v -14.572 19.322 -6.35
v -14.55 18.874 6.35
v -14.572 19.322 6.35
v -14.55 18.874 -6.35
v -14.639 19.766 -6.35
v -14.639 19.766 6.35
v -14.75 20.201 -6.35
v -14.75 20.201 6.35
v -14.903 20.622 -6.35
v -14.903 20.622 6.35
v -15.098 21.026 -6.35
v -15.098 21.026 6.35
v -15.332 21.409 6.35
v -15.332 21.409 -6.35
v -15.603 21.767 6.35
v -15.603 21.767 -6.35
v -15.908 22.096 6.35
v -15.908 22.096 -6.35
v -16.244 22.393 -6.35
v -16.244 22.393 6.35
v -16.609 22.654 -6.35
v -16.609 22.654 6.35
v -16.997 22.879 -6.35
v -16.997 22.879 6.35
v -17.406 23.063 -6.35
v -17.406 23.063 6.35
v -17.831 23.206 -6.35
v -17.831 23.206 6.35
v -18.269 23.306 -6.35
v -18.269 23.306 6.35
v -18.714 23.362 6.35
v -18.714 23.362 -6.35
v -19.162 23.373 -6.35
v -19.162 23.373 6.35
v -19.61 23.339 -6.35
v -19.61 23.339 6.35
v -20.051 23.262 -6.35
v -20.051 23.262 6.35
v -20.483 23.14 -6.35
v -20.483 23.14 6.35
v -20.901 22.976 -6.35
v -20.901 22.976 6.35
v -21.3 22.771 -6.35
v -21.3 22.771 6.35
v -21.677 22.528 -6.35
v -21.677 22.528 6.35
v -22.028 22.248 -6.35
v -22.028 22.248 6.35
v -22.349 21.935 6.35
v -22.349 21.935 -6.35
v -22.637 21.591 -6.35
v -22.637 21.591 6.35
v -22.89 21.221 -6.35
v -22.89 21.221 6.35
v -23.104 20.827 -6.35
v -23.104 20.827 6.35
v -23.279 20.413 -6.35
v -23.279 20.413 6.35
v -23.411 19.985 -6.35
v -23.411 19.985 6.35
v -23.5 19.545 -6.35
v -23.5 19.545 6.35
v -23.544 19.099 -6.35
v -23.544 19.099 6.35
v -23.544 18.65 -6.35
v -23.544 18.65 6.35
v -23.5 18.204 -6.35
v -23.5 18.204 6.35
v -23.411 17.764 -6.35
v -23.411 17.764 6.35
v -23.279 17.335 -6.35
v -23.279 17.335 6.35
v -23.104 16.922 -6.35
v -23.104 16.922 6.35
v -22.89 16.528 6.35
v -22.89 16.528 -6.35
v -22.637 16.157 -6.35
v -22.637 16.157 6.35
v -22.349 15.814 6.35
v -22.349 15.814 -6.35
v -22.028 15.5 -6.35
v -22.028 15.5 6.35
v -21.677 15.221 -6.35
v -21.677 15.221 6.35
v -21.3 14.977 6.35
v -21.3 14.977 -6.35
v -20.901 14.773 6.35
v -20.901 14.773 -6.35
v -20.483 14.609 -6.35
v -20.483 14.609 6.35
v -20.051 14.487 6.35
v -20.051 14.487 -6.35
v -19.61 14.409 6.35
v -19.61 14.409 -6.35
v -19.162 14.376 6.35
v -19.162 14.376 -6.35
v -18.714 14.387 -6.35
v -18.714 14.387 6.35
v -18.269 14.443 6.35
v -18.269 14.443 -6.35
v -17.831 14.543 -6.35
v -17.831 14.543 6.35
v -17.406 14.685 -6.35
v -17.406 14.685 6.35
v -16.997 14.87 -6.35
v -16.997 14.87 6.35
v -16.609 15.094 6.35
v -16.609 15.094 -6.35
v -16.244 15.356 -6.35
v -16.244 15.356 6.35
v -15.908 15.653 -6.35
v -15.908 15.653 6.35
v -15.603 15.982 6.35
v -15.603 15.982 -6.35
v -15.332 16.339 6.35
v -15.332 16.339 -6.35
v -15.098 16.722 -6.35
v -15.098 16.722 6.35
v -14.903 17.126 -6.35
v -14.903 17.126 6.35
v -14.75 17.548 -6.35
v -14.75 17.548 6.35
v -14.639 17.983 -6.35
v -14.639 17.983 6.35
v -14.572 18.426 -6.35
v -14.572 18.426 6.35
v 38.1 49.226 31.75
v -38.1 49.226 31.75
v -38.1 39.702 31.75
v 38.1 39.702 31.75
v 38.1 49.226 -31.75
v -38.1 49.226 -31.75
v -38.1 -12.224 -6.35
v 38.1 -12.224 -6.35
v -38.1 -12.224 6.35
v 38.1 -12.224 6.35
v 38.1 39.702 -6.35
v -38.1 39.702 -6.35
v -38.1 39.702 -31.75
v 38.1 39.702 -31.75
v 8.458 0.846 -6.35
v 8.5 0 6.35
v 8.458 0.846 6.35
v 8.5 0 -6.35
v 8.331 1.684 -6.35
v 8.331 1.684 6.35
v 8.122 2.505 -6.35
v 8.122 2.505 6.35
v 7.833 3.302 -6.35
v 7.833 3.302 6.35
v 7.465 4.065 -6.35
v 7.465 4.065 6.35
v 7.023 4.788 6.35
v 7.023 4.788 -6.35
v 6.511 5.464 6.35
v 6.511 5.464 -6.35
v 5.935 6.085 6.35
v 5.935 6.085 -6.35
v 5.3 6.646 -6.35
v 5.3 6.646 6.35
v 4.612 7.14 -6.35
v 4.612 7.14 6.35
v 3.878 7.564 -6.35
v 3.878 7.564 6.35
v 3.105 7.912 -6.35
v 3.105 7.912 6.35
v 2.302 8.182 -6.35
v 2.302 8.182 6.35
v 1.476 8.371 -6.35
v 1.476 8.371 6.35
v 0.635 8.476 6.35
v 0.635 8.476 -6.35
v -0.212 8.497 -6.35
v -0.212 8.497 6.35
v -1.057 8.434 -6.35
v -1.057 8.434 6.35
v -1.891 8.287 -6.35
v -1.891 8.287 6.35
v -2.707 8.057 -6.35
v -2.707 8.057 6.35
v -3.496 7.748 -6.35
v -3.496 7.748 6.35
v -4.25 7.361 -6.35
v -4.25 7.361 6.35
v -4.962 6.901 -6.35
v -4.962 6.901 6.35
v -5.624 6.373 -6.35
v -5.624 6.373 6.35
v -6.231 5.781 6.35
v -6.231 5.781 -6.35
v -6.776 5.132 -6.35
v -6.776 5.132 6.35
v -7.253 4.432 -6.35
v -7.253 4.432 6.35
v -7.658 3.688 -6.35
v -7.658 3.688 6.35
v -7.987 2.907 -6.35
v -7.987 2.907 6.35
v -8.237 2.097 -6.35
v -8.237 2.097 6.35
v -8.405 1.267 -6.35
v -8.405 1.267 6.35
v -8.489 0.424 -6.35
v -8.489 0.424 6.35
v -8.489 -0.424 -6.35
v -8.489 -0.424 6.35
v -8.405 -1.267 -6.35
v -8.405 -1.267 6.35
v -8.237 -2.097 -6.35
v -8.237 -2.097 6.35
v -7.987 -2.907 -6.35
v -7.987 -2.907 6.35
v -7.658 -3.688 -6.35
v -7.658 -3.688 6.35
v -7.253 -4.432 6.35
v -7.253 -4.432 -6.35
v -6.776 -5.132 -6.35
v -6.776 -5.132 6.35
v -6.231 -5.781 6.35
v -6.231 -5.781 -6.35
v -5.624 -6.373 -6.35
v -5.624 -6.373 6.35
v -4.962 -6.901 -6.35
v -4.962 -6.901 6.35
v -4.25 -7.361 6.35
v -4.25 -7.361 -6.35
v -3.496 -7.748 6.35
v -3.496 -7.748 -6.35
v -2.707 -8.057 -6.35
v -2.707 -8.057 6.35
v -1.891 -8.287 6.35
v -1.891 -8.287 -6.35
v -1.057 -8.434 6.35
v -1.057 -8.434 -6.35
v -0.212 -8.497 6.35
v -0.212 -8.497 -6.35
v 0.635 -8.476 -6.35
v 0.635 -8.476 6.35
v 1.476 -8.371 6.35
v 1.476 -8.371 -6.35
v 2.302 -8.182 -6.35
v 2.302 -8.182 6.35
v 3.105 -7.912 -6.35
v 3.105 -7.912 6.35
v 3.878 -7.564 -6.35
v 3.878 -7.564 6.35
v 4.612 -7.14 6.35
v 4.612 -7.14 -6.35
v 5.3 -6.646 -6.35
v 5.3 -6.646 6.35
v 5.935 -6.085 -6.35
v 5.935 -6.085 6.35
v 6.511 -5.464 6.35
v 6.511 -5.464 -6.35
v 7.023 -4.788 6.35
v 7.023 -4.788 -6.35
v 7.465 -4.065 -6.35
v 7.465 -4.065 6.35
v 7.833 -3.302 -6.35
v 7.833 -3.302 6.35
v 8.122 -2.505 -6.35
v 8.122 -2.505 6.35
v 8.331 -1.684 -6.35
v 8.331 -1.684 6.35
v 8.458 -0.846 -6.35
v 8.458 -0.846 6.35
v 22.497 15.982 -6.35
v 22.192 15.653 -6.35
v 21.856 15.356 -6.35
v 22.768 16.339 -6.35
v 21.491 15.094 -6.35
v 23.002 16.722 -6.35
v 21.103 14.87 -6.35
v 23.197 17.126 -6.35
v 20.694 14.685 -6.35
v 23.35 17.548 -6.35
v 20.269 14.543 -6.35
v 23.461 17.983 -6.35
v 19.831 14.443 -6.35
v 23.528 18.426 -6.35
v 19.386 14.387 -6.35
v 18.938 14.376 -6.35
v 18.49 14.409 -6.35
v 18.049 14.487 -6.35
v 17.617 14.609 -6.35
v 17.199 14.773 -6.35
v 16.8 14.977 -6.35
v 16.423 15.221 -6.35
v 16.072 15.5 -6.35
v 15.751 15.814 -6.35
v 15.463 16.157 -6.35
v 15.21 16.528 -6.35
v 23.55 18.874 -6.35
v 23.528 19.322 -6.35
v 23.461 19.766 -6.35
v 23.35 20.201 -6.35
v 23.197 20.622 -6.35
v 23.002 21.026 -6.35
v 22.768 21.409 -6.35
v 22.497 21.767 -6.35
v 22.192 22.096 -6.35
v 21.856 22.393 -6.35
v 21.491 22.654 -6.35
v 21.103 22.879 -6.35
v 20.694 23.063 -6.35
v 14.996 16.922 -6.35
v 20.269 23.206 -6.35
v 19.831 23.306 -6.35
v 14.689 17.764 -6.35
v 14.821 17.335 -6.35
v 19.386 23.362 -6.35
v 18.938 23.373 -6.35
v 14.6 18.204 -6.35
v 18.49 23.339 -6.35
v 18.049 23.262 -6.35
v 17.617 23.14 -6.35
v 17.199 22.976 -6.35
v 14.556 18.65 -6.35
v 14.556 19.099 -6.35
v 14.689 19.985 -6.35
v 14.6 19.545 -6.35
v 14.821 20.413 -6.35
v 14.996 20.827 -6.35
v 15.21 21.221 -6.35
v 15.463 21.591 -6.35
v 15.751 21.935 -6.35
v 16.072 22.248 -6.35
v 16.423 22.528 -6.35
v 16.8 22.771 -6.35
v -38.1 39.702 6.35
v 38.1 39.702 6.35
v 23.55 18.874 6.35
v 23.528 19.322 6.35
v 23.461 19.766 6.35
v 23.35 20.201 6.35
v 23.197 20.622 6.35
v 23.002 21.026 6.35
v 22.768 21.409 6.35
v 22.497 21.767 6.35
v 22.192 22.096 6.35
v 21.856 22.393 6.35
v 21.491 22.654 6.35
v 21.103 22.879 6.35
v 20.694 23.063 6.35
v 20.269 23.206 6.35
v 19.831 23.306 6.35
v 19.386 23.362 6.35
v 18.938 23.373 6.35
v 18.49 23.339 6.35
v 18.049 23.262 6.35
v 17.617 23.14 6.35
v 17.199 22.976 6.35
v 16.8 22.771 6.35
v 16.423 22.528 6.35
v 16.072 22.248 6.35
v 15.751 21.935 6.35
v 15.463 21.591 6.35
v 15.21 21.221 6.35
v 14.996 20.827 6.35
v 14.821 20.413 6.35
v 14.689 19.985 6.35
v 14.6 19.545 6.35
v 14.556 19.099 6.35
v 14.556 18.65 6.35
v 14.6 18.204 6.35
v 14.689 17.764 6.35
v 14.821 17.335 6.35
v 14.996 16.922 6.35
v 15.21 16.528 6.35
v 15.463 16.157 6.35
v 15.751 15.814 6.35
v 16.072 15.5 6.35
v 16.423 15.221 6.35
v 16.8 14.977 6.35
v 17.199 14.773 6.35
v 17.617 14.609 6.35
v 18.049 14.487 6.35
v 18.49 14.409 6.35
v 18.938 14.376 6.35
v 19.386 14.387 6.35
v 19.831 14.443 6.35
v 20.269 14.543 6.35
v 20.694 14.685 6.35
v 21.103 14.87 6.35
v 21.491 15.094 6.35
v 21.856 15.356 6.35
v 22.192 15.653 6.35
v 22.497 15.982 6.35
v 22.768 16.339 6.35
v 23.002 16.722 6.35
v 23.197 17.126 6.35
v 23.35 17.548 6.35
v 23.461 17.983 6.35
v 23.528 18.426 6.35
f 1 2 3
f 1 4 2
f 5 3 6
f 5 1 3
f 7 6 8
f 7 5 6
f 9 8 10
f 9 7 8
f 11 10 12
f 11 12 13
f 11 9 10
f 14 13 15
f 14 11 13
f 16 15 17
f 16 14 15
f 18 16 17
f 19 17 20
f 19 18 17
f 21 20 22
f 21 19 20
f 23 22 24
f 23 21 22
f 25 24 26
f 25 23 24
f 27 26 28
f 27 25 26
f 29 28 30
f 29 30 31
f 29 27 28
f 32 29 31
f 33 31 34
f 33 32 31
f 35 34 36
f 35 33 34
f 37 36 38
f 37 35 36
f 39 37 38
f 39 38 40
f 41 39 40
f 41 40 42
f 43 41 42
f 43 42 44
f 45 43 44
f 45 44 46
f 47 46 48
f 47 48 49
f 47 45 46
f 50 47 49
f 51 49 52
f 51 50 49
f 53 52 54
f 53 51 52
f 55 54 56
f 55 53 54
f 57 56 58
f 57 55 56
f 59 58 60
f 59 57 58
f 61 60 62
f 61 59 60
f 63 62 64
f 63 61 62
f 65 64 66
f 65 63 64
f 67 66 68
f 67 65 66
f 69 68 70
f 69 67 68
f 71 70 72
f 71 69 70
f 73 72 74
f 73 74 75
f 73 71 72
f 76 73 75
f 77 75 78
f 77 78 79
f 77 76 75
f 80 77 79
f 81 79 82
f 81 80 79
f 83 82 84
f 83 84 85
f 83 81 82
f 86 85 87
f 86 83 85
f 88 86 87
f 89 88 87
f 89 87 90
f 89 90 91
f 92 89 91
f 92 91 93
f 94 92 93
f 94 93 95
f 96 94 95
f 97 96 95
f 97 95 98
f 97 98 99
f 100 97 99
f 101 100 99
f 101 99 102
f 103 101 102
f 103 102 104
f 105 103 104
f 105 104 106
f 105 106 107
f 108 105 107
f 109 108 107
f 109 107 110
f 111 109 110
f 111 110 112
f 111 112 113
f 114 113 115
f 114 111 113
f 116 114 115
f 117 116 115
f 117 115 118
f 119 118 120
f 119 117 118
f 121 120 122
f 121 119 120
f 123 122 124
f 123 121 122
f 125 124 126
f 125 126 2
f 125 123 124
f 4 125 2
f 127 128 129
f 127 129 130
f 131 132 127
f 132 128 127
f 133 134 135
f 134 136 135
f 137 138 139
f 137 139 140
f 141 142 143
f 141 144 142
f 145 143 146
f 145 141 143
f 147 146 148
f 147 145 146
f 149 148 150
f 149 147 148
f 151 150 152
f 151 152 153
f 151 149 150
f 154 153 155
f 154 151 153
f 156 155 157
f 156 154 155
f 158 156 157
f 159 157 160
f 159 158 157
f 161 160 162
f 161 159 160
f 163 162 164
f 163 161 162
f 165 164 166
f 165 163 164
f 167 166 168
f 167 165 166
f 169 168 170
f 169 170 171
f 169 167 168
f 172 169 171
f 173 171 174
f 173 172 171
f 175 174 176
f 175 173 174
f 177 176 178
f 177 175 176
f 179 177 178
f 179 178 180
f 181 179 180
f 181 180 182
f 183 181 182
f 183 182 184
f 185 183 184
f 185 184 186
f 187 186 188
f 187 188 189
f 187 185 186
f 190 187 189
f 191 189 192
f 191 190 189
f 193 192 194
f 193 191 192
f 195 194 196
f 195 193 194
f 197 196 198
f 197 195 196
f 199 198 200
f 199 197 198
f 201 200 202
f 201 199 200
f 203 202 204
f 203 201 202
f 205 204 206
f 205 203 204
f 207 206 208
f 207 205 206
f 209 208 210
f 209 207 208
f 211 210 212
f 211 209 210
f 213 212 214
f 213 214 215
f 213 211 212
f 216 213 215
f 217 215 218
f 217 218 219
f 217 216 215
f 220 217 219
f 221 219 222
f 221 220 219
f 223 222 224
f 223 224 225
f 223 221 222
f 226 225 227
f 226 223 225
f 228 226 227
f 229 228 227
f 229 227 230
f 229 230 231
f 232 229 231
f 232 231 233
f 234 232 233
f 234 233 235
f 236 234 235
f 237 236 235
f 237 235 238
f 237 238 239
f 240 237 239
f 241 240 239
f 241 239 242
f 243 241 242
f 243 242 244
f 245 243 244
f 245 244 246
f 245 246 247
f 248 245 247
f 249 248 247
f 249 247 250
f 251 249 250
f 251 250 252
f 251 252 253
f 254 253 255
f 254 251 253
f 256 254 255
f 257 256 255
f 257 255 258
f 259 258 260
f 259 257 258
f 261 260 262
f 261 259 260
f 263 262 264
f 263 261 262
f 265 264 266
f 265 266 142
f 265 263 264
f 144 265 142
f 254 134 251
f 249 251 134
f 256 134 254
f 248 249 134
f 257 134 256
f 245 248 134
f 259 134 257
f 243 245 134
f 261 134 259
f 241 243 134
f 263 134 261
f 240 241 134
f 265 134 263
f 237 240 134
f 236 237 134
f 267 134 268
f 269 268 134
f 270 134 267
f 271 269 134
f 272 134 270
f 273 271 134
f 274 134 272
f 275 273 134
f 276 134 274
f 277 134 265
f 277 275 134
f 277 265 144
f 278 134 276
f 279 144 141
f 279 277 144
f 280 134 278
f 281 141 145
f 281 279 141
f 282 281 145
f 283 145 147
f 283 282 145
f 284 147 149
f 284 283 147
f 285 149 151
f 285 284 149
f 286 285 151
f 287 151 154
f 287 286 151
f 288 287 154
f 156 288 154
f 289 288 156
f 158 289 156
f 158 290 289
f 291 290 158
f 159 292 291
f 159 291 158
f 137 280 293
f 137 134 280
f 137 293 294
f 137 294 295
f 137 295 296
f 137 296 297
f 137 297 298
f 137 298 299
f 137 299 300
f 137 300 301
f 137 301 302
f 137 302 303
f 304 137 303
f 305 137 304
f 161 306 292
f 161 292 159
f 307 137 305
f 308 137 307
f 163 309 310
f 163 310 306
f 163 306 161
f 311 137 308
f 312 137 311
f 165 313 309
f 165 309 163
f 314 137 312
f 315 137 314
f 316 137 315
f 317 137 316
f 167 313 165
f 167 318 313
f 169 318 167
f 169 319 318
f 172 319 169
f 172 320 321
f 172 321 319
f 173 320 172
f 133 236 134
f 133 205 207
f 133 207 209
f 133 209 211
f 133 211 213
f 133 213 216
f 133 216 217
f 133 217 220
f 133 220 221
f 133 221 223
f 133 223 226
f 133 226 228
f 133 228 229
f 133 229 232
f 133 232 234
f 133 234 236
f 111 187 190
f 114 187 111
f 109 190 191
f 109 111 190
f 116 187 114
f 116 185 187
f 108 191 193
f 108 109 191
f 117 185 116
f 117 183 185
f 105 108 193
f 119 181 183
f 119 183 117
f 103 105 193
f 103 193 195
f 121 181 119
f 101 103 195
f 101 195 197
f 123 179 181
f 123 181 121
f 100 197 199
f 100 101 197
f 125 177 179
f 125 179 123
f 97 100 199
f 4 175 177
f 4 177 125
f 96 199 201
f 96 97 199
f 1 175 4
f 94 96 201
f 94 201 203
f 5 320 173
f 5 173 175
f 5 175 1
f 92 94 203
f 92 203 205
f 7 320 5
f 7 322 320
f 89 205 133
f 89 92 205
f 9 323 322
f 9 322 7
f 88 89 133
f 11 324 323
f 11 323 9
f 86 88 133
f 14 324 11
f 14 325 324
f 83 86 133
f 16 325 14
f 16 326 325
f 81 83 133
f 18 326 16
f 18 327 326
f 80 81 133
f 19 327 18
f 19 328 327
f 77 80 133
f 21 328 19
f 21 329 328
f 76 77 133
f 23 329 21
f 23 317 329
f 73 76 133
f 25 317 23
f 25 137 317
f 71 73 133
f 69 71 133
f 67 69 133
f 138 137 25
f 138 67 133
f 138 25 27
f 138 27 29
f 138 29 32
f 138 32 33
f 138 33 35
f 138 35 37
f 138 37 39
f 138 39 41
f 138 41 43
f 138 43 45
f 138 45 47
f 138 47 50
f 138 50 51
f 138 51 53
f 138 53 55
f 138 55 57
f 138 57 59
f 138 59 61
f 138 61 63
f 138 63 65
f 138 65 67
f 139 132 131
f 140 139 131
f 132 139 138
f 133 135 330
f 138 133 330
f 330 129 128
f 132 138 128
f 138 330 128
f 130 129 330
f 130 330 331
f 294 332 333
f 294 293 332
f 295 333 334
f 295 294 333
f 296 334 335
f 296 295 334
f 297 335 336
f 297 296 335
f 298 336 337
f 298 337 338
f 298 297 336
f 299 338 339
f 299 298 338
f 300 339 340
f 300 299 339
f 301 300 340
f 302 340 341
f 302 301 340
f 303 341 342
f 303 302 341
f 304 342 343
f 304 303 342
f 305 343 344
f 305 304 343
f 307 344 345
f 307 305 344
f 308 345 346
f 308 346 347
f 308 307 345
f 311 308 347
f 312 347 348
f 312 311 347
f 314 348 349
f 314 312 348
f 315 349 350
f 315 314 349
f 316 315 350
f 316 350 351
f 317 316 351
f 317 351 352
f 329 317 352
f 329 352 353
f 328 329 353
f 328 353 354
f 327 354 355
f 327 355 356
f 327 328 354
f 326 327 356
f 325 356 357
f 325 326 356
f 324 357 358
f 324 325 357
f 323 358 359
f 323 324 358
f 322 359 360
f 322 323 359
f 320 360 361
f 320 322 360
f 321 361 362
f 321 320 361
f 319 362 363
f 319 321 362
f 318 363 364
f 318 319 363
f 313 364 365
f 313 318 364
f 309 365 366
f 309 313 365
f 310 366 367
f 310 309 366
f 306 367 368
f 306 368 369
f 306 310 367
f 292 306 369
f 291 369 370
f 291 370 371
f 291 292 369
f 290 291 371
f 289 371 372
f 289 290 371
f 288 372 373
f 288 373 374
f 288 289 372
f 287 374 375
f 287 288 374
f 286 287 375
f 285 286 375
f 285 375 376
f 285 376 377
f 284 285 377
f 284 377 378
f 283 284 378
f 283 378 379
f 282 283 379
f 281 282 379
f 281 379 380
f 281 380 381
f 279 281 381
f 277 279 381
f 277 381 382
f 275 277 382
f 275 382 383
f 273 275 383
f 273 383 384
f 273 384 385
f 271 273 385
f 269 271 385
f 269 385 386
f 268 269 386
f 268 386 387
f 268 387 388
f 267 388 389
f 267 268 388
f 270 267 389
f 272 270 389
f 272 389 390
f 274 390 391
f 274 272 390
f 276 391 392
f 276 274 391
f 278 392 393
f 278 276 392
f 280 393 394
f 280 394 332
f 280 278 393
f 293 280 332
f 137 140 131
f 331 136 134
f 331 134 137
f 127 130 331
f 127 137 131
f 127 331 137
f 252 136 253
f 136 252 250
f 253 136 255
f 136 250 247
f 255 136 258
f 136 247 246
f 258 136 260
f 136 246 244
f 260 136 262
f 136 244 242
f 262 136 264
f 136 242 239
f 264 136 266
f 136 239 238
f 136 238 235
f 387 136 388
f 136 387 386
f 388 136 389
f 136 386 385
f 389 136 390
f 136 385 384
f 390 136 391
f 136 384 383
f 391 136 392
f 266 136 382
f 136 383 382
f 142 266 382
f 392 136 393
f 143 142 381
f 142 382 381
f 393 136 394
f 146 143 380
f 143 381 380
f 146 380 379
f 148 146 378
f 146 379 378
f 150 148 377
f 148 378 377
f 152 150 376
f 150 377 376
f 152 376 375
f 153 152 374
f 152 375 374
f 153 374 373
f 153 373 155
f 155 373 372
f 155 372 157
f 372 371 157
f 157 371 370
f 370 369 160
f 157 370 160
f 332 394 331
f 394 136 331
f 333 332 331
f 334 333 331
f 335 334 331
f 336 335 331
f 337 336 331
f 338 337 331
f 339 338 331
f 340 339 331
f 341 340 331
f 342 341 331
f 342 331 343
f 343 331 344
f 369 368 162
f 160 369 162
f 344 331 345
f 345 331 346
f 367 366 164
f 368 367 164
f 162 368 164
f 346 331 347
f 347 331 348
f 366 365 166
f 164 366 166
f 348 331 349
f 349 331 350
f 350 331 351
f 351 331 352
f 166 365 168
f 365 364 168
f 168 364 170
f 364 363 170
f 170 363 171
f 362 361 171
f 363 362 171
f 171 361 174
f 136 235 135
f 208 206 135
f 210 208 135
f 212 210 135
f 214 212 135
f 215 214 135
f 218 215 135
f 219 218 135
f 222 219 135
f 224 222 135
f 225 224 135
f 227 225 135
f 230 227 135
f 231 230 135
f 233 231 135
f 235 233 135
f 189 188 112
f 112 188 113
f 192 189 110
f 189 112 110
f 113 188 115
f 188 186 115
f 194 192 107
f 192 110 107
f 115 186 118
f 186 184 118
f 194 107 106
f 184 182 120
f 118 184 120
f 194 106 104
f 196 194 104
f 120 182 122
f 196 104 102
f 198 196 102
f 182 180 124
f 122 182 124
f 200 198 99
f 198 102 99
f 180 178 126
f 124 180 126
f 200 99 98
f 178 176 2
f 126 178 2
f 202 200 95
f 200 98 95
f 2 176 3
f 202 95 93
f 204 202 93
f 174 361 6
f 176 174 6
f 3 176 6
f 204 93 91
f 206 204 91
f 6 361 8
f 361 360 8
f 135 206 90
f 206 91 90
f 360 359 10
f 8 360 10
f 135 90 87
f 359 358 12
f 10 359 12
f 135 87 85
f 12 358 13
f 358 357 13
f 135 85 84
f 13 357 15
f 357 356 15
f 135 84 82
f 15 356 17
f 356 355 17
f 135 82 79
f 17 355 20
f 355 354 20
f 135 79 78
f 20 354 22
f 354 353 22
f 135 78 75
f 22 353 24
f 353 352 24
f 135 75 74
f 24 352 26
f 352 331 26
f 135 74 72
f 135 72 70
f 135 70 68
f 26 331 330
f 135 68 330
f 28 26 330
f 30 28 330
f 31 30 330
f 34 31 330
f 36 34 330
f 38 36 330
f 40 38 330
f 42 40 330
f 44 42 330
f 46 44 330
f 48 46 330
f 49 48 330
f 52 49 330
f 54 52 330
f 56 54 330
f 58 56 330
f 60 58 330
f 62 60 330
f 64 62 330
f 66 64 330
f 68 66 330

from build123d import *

# Parameters (mm, degrees)
SKETCH1_W           = 76.2
SKETCH1_H           = 9.523545078
BOSS_EXTRUDE2_DEPTH = 31.75
SKETCH1_6_R         = 8.5
SKETCH1_6_R_2       = 4.5
BOSS_EXTRUDE3_DEPTH = 6.35


with BuildPart() as part:
    # Sketch1 → Boss-Extrude2 (new, symmetric)
    with BuildSketch(Plane.XY):
        with Locations((0, 44.46410331)):
            Rectangle(SKETCH1_W, SKETCH1_H)
    extrude(amount=BOSS_EXTRUDE2_DEPTH, both=True)

    # Sketch1<6> → Boss-Extrude3 (add, symmetric)
    with BuildSketch(Plane.XY):
        Polygon((-38.1, -12.224), (38.1, -12.224), (38.1, 12.224), (38.1, 39.702330771), (-38.1, 39.702330771), (-38.1, 12.224), align=None)
        Circle(SKETCH1_6_R, mode=Mode.SUBTRACT)
        with Locations((-19.05, 18.874330771)):
            Circle(SKETCH1_6_R_2, mode=Mode.SUBTRACT)
        with Locations((19.05, 18.874330771)):
            Circle(SKETCH1_6_R_2, mode=Mode.SUBTRACT)
    extrude(amount=BOSS_EXTRUDE3_DEPTH, both=True)


solid = part.part
